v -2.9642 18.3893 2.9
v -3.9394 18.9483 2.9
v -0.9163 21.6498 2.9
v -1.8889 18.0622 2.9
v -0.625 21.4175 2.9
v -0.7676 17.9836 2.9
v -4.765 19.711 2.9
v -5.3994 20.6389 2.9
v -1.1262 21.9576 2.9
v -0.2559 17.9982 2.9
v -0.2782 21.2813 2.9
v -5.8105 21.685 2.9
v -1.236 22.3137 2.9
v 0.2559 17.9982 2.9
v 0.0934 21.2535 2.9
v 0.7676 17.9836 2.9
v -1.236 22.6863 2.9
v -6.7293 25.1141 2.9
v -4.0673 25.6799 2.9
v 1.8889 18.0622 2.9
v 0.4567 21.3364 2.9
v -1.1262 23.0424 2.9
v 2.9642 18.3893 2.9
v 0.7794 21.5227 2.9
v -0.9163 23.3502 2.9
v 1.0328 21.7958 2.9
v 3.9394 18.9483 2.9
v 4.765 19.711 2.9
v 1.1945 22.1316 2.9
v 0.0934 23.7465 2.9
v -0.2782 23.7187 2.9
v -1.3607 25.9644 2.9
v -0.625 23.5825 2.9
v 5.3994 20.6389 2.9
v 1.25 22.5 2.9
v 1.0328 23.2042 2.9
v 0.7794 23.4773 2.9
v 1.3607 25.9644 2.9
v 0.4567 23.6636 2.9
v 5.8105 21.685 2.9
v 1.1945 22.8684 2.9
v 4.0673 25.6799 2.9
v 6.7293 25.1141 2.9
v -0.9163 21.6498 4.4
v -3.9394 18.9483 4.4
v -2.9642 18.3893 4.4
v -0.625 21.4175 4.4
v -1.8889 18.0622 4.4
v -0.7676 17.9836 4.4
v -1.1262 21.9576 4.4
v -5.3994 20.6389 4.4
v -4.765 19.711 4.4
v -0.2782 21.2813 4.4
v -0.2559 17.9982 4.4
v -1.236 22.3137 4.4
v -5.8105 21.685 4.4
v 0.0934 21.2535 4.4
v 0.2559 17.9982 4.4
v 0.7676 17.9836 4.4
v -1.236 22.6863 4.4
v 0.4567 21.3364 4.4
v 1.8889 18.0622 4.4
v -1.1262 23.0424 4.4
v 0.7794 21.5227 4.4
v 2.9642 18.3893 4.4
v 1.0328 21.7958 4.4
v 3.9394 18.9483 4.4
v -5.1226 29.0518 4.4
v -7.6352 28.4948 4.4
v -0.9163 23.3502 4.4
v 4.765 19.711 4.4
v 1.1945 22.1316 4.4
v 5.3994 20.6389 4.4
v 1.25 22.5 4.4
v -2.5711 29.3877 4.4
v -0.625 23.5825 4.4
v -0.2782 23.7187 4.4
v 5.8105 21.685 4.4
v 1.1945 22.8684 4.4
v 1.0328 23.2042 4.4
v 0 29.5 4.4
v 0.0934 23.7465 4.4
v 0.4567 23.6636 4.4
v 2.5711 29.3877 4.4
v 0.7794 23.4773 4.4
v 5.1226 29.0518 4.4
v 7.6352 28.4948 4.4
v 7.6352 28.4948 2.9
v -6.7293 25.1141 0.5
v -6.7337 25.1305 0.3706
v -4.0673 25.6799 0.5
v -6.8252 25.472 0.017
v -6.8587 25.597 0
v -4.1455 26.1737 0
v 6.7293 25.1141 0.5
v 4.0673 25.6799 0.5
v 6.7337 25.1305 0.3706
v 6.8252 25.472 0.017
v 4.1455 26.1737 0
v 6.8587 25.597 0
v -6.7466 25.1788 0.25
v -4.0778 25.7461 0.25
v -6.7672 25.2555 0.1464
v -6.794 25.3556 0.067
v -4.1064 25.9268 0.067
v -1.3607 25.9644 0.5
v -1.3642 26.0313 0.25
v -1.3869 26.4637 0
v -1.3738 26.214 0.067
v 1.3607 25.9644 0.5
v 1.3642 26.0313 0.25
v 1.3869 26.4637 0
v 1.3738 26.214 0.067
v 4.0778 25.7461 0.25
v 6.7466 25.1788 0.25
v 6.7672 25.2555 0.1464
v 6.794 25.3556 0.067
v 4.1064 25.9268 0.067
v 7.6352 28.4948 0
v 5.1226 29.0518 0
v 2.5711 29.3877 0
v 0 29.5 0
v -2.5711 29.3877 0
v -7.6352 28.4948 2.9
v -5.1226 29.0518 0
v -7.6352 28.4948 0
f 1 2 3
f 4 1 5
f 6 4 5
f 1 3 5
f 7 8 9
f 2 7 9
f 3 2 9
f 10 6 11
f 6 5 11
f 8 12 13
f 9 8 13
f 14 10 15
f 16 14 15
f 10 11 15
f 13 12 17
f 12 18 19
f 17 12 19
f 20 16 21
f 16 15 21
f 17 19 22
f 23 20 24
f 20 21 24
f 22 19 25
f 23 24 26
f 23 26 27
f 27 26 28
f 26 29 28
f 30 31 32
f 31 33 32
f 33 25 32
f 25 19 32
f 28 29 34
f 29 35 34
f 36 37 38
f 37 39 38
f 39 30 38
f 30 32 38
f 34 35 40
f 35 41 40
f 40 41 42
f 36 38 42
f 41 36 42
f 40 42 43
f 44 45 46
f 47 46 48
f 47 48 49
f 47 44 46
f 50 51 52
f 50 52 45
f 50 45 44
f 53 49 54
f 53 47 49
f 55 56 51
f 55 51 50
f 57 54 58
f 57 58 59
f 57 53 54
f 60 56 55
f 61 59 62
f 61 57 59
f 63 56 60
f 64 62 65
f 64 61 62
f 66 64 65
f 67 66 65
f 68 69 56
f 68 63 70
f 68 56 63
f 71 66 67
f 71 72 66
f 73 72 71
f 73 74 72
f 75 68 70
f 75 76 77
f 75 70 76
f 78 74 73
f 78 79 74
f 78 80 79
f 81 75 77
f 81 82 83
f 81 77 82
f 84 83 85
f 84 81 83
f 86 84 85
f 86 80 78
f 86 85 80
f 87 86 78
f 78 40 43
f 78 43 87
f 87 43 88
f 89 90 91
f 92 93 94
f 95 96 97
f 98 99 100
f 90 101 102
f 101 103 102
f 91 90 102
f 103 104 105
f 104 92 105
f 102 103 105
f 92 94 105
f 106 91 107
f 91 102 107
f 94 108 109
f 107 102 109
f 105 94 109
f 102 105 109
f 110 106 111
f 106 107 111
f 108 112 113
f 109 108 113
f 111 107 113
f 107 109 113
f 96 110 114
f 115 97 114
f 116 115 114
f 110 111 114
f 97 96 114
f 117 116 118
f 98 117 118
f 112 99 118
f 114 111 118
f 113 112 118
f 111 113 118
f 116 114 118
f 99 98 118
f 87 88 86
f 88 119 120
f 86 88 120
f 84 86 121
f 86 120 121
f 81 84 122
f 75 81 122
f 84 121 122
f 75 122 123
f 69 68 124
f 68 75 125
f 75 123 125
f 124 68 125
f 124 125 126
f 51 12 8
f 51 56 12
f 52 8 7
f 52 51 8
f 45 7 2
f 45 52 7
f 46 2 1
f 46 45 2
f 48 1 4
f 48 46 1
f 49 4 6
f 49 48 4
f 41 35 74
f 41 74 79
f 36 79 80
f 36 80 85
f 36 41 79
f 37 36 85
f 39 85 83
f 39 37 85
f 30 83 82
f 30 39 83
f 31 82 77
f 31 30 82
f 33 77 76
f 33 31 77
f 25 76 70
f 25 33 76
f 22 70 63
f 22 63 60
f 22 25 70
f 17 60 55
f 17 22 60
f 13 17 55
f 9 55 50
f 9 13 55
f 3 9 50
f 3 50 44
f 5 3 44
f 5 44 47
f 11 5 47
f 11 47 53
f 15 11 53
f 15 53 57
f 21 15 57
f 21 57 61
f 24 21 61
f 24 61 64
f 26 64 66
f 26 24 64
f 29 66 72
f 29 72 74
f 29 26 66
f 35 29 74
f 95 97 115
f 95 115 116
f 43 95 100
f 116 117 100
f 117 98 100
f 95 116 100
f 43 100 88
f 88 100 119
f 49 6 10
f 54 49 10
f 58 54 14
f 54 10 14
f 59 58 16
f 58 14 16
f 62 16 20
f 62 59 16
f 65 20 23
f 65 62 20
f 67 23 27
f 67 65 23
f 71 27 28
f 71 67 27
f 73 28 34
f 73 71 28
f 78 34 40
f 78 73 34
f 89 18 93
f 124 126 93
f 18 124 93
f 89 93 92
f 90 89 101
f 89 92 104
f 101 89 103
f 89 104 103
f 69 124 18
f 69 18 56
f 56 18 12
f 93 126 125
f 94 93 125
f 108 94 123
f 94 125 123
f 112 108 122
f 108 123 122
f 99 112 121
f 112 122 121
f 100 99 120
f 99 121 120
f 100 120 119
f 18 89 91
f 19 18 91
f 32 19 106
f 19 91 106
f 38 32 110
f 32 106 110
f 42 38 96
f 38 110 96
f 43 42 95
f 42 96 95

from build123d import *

# Parameters (mm, degrees)
EXTRUDE_1_DEPTH = 2.9
SKETCH_2_R      = 1.25
EXTRUDE_2_DEPTH = 1.5
FILLET_1_R      = 5
FILLET_2_R      = 0.5


with BuildPart() as part:
    # 草图1 → 凸台-拉伸1 (new body)
    with BuildSketch(Plane.XY):
        with BuildLine():
            Line((-7.635161831, 28.494811876), (-6.729295173, 25.114071484))
            ThreePointArc((-6.729295173, 25.114071484), (0, 26), (6.729295173, 25.114071484))
            Line((6.729295173, 25.114071484), (7.635161831, 28.494811876))
            ThreePointArc((7.635161831, 28.494811876), (0, 29.5), (-7.635161831, 28.494811876))
        make_face()
    extrude(amount=EXTRUDE_1_DEPTH)

    # 草图2 → 凸台-拉伸2 (add)
    with BuildSketch(Plane.XY.offset(2.9)):
        with BuildLine():
            Line((-7.635161831, 28.494811876), (-4.658742812, 17.386664873))
            ThreePointArc((-4.658742812, 17.386664873), (0, 18), (4.658742812, 17.386664873))
            Line((4.658742812, 17.386664873), (7.635161831, 28.494811876))
            ThreePointArc((7.635161831, 28.494811876), (0, 29.5), (-7.635161831, 28.494811876))
        make_face()
        with Locations((0, 22.5)):
            Circle(SKETCH_2_R, mode=Mode.SUBTRACT)
    extrude(amount=EXTRUDE_2_DEPTH)

    # 圆角1
    fillet_1_edges = [part.edges().sort_by_distance(p)[0] for p in [
        (-4.658742812, 17.386664873, 3.65),
        (4.658742812, 17.386664873, 3.65),
    ]]
    fillet(fillet_1_edges, radius=FILLET_1_R)

    # 圆角2
    fillet_2_edges = [part.edges().sort_by_distance(p)[0] for p in [
        (0, 26, 0),
    ]]
    fillet(fillet_2_edges, radius=FILLET_2_R)


solid = part.part
